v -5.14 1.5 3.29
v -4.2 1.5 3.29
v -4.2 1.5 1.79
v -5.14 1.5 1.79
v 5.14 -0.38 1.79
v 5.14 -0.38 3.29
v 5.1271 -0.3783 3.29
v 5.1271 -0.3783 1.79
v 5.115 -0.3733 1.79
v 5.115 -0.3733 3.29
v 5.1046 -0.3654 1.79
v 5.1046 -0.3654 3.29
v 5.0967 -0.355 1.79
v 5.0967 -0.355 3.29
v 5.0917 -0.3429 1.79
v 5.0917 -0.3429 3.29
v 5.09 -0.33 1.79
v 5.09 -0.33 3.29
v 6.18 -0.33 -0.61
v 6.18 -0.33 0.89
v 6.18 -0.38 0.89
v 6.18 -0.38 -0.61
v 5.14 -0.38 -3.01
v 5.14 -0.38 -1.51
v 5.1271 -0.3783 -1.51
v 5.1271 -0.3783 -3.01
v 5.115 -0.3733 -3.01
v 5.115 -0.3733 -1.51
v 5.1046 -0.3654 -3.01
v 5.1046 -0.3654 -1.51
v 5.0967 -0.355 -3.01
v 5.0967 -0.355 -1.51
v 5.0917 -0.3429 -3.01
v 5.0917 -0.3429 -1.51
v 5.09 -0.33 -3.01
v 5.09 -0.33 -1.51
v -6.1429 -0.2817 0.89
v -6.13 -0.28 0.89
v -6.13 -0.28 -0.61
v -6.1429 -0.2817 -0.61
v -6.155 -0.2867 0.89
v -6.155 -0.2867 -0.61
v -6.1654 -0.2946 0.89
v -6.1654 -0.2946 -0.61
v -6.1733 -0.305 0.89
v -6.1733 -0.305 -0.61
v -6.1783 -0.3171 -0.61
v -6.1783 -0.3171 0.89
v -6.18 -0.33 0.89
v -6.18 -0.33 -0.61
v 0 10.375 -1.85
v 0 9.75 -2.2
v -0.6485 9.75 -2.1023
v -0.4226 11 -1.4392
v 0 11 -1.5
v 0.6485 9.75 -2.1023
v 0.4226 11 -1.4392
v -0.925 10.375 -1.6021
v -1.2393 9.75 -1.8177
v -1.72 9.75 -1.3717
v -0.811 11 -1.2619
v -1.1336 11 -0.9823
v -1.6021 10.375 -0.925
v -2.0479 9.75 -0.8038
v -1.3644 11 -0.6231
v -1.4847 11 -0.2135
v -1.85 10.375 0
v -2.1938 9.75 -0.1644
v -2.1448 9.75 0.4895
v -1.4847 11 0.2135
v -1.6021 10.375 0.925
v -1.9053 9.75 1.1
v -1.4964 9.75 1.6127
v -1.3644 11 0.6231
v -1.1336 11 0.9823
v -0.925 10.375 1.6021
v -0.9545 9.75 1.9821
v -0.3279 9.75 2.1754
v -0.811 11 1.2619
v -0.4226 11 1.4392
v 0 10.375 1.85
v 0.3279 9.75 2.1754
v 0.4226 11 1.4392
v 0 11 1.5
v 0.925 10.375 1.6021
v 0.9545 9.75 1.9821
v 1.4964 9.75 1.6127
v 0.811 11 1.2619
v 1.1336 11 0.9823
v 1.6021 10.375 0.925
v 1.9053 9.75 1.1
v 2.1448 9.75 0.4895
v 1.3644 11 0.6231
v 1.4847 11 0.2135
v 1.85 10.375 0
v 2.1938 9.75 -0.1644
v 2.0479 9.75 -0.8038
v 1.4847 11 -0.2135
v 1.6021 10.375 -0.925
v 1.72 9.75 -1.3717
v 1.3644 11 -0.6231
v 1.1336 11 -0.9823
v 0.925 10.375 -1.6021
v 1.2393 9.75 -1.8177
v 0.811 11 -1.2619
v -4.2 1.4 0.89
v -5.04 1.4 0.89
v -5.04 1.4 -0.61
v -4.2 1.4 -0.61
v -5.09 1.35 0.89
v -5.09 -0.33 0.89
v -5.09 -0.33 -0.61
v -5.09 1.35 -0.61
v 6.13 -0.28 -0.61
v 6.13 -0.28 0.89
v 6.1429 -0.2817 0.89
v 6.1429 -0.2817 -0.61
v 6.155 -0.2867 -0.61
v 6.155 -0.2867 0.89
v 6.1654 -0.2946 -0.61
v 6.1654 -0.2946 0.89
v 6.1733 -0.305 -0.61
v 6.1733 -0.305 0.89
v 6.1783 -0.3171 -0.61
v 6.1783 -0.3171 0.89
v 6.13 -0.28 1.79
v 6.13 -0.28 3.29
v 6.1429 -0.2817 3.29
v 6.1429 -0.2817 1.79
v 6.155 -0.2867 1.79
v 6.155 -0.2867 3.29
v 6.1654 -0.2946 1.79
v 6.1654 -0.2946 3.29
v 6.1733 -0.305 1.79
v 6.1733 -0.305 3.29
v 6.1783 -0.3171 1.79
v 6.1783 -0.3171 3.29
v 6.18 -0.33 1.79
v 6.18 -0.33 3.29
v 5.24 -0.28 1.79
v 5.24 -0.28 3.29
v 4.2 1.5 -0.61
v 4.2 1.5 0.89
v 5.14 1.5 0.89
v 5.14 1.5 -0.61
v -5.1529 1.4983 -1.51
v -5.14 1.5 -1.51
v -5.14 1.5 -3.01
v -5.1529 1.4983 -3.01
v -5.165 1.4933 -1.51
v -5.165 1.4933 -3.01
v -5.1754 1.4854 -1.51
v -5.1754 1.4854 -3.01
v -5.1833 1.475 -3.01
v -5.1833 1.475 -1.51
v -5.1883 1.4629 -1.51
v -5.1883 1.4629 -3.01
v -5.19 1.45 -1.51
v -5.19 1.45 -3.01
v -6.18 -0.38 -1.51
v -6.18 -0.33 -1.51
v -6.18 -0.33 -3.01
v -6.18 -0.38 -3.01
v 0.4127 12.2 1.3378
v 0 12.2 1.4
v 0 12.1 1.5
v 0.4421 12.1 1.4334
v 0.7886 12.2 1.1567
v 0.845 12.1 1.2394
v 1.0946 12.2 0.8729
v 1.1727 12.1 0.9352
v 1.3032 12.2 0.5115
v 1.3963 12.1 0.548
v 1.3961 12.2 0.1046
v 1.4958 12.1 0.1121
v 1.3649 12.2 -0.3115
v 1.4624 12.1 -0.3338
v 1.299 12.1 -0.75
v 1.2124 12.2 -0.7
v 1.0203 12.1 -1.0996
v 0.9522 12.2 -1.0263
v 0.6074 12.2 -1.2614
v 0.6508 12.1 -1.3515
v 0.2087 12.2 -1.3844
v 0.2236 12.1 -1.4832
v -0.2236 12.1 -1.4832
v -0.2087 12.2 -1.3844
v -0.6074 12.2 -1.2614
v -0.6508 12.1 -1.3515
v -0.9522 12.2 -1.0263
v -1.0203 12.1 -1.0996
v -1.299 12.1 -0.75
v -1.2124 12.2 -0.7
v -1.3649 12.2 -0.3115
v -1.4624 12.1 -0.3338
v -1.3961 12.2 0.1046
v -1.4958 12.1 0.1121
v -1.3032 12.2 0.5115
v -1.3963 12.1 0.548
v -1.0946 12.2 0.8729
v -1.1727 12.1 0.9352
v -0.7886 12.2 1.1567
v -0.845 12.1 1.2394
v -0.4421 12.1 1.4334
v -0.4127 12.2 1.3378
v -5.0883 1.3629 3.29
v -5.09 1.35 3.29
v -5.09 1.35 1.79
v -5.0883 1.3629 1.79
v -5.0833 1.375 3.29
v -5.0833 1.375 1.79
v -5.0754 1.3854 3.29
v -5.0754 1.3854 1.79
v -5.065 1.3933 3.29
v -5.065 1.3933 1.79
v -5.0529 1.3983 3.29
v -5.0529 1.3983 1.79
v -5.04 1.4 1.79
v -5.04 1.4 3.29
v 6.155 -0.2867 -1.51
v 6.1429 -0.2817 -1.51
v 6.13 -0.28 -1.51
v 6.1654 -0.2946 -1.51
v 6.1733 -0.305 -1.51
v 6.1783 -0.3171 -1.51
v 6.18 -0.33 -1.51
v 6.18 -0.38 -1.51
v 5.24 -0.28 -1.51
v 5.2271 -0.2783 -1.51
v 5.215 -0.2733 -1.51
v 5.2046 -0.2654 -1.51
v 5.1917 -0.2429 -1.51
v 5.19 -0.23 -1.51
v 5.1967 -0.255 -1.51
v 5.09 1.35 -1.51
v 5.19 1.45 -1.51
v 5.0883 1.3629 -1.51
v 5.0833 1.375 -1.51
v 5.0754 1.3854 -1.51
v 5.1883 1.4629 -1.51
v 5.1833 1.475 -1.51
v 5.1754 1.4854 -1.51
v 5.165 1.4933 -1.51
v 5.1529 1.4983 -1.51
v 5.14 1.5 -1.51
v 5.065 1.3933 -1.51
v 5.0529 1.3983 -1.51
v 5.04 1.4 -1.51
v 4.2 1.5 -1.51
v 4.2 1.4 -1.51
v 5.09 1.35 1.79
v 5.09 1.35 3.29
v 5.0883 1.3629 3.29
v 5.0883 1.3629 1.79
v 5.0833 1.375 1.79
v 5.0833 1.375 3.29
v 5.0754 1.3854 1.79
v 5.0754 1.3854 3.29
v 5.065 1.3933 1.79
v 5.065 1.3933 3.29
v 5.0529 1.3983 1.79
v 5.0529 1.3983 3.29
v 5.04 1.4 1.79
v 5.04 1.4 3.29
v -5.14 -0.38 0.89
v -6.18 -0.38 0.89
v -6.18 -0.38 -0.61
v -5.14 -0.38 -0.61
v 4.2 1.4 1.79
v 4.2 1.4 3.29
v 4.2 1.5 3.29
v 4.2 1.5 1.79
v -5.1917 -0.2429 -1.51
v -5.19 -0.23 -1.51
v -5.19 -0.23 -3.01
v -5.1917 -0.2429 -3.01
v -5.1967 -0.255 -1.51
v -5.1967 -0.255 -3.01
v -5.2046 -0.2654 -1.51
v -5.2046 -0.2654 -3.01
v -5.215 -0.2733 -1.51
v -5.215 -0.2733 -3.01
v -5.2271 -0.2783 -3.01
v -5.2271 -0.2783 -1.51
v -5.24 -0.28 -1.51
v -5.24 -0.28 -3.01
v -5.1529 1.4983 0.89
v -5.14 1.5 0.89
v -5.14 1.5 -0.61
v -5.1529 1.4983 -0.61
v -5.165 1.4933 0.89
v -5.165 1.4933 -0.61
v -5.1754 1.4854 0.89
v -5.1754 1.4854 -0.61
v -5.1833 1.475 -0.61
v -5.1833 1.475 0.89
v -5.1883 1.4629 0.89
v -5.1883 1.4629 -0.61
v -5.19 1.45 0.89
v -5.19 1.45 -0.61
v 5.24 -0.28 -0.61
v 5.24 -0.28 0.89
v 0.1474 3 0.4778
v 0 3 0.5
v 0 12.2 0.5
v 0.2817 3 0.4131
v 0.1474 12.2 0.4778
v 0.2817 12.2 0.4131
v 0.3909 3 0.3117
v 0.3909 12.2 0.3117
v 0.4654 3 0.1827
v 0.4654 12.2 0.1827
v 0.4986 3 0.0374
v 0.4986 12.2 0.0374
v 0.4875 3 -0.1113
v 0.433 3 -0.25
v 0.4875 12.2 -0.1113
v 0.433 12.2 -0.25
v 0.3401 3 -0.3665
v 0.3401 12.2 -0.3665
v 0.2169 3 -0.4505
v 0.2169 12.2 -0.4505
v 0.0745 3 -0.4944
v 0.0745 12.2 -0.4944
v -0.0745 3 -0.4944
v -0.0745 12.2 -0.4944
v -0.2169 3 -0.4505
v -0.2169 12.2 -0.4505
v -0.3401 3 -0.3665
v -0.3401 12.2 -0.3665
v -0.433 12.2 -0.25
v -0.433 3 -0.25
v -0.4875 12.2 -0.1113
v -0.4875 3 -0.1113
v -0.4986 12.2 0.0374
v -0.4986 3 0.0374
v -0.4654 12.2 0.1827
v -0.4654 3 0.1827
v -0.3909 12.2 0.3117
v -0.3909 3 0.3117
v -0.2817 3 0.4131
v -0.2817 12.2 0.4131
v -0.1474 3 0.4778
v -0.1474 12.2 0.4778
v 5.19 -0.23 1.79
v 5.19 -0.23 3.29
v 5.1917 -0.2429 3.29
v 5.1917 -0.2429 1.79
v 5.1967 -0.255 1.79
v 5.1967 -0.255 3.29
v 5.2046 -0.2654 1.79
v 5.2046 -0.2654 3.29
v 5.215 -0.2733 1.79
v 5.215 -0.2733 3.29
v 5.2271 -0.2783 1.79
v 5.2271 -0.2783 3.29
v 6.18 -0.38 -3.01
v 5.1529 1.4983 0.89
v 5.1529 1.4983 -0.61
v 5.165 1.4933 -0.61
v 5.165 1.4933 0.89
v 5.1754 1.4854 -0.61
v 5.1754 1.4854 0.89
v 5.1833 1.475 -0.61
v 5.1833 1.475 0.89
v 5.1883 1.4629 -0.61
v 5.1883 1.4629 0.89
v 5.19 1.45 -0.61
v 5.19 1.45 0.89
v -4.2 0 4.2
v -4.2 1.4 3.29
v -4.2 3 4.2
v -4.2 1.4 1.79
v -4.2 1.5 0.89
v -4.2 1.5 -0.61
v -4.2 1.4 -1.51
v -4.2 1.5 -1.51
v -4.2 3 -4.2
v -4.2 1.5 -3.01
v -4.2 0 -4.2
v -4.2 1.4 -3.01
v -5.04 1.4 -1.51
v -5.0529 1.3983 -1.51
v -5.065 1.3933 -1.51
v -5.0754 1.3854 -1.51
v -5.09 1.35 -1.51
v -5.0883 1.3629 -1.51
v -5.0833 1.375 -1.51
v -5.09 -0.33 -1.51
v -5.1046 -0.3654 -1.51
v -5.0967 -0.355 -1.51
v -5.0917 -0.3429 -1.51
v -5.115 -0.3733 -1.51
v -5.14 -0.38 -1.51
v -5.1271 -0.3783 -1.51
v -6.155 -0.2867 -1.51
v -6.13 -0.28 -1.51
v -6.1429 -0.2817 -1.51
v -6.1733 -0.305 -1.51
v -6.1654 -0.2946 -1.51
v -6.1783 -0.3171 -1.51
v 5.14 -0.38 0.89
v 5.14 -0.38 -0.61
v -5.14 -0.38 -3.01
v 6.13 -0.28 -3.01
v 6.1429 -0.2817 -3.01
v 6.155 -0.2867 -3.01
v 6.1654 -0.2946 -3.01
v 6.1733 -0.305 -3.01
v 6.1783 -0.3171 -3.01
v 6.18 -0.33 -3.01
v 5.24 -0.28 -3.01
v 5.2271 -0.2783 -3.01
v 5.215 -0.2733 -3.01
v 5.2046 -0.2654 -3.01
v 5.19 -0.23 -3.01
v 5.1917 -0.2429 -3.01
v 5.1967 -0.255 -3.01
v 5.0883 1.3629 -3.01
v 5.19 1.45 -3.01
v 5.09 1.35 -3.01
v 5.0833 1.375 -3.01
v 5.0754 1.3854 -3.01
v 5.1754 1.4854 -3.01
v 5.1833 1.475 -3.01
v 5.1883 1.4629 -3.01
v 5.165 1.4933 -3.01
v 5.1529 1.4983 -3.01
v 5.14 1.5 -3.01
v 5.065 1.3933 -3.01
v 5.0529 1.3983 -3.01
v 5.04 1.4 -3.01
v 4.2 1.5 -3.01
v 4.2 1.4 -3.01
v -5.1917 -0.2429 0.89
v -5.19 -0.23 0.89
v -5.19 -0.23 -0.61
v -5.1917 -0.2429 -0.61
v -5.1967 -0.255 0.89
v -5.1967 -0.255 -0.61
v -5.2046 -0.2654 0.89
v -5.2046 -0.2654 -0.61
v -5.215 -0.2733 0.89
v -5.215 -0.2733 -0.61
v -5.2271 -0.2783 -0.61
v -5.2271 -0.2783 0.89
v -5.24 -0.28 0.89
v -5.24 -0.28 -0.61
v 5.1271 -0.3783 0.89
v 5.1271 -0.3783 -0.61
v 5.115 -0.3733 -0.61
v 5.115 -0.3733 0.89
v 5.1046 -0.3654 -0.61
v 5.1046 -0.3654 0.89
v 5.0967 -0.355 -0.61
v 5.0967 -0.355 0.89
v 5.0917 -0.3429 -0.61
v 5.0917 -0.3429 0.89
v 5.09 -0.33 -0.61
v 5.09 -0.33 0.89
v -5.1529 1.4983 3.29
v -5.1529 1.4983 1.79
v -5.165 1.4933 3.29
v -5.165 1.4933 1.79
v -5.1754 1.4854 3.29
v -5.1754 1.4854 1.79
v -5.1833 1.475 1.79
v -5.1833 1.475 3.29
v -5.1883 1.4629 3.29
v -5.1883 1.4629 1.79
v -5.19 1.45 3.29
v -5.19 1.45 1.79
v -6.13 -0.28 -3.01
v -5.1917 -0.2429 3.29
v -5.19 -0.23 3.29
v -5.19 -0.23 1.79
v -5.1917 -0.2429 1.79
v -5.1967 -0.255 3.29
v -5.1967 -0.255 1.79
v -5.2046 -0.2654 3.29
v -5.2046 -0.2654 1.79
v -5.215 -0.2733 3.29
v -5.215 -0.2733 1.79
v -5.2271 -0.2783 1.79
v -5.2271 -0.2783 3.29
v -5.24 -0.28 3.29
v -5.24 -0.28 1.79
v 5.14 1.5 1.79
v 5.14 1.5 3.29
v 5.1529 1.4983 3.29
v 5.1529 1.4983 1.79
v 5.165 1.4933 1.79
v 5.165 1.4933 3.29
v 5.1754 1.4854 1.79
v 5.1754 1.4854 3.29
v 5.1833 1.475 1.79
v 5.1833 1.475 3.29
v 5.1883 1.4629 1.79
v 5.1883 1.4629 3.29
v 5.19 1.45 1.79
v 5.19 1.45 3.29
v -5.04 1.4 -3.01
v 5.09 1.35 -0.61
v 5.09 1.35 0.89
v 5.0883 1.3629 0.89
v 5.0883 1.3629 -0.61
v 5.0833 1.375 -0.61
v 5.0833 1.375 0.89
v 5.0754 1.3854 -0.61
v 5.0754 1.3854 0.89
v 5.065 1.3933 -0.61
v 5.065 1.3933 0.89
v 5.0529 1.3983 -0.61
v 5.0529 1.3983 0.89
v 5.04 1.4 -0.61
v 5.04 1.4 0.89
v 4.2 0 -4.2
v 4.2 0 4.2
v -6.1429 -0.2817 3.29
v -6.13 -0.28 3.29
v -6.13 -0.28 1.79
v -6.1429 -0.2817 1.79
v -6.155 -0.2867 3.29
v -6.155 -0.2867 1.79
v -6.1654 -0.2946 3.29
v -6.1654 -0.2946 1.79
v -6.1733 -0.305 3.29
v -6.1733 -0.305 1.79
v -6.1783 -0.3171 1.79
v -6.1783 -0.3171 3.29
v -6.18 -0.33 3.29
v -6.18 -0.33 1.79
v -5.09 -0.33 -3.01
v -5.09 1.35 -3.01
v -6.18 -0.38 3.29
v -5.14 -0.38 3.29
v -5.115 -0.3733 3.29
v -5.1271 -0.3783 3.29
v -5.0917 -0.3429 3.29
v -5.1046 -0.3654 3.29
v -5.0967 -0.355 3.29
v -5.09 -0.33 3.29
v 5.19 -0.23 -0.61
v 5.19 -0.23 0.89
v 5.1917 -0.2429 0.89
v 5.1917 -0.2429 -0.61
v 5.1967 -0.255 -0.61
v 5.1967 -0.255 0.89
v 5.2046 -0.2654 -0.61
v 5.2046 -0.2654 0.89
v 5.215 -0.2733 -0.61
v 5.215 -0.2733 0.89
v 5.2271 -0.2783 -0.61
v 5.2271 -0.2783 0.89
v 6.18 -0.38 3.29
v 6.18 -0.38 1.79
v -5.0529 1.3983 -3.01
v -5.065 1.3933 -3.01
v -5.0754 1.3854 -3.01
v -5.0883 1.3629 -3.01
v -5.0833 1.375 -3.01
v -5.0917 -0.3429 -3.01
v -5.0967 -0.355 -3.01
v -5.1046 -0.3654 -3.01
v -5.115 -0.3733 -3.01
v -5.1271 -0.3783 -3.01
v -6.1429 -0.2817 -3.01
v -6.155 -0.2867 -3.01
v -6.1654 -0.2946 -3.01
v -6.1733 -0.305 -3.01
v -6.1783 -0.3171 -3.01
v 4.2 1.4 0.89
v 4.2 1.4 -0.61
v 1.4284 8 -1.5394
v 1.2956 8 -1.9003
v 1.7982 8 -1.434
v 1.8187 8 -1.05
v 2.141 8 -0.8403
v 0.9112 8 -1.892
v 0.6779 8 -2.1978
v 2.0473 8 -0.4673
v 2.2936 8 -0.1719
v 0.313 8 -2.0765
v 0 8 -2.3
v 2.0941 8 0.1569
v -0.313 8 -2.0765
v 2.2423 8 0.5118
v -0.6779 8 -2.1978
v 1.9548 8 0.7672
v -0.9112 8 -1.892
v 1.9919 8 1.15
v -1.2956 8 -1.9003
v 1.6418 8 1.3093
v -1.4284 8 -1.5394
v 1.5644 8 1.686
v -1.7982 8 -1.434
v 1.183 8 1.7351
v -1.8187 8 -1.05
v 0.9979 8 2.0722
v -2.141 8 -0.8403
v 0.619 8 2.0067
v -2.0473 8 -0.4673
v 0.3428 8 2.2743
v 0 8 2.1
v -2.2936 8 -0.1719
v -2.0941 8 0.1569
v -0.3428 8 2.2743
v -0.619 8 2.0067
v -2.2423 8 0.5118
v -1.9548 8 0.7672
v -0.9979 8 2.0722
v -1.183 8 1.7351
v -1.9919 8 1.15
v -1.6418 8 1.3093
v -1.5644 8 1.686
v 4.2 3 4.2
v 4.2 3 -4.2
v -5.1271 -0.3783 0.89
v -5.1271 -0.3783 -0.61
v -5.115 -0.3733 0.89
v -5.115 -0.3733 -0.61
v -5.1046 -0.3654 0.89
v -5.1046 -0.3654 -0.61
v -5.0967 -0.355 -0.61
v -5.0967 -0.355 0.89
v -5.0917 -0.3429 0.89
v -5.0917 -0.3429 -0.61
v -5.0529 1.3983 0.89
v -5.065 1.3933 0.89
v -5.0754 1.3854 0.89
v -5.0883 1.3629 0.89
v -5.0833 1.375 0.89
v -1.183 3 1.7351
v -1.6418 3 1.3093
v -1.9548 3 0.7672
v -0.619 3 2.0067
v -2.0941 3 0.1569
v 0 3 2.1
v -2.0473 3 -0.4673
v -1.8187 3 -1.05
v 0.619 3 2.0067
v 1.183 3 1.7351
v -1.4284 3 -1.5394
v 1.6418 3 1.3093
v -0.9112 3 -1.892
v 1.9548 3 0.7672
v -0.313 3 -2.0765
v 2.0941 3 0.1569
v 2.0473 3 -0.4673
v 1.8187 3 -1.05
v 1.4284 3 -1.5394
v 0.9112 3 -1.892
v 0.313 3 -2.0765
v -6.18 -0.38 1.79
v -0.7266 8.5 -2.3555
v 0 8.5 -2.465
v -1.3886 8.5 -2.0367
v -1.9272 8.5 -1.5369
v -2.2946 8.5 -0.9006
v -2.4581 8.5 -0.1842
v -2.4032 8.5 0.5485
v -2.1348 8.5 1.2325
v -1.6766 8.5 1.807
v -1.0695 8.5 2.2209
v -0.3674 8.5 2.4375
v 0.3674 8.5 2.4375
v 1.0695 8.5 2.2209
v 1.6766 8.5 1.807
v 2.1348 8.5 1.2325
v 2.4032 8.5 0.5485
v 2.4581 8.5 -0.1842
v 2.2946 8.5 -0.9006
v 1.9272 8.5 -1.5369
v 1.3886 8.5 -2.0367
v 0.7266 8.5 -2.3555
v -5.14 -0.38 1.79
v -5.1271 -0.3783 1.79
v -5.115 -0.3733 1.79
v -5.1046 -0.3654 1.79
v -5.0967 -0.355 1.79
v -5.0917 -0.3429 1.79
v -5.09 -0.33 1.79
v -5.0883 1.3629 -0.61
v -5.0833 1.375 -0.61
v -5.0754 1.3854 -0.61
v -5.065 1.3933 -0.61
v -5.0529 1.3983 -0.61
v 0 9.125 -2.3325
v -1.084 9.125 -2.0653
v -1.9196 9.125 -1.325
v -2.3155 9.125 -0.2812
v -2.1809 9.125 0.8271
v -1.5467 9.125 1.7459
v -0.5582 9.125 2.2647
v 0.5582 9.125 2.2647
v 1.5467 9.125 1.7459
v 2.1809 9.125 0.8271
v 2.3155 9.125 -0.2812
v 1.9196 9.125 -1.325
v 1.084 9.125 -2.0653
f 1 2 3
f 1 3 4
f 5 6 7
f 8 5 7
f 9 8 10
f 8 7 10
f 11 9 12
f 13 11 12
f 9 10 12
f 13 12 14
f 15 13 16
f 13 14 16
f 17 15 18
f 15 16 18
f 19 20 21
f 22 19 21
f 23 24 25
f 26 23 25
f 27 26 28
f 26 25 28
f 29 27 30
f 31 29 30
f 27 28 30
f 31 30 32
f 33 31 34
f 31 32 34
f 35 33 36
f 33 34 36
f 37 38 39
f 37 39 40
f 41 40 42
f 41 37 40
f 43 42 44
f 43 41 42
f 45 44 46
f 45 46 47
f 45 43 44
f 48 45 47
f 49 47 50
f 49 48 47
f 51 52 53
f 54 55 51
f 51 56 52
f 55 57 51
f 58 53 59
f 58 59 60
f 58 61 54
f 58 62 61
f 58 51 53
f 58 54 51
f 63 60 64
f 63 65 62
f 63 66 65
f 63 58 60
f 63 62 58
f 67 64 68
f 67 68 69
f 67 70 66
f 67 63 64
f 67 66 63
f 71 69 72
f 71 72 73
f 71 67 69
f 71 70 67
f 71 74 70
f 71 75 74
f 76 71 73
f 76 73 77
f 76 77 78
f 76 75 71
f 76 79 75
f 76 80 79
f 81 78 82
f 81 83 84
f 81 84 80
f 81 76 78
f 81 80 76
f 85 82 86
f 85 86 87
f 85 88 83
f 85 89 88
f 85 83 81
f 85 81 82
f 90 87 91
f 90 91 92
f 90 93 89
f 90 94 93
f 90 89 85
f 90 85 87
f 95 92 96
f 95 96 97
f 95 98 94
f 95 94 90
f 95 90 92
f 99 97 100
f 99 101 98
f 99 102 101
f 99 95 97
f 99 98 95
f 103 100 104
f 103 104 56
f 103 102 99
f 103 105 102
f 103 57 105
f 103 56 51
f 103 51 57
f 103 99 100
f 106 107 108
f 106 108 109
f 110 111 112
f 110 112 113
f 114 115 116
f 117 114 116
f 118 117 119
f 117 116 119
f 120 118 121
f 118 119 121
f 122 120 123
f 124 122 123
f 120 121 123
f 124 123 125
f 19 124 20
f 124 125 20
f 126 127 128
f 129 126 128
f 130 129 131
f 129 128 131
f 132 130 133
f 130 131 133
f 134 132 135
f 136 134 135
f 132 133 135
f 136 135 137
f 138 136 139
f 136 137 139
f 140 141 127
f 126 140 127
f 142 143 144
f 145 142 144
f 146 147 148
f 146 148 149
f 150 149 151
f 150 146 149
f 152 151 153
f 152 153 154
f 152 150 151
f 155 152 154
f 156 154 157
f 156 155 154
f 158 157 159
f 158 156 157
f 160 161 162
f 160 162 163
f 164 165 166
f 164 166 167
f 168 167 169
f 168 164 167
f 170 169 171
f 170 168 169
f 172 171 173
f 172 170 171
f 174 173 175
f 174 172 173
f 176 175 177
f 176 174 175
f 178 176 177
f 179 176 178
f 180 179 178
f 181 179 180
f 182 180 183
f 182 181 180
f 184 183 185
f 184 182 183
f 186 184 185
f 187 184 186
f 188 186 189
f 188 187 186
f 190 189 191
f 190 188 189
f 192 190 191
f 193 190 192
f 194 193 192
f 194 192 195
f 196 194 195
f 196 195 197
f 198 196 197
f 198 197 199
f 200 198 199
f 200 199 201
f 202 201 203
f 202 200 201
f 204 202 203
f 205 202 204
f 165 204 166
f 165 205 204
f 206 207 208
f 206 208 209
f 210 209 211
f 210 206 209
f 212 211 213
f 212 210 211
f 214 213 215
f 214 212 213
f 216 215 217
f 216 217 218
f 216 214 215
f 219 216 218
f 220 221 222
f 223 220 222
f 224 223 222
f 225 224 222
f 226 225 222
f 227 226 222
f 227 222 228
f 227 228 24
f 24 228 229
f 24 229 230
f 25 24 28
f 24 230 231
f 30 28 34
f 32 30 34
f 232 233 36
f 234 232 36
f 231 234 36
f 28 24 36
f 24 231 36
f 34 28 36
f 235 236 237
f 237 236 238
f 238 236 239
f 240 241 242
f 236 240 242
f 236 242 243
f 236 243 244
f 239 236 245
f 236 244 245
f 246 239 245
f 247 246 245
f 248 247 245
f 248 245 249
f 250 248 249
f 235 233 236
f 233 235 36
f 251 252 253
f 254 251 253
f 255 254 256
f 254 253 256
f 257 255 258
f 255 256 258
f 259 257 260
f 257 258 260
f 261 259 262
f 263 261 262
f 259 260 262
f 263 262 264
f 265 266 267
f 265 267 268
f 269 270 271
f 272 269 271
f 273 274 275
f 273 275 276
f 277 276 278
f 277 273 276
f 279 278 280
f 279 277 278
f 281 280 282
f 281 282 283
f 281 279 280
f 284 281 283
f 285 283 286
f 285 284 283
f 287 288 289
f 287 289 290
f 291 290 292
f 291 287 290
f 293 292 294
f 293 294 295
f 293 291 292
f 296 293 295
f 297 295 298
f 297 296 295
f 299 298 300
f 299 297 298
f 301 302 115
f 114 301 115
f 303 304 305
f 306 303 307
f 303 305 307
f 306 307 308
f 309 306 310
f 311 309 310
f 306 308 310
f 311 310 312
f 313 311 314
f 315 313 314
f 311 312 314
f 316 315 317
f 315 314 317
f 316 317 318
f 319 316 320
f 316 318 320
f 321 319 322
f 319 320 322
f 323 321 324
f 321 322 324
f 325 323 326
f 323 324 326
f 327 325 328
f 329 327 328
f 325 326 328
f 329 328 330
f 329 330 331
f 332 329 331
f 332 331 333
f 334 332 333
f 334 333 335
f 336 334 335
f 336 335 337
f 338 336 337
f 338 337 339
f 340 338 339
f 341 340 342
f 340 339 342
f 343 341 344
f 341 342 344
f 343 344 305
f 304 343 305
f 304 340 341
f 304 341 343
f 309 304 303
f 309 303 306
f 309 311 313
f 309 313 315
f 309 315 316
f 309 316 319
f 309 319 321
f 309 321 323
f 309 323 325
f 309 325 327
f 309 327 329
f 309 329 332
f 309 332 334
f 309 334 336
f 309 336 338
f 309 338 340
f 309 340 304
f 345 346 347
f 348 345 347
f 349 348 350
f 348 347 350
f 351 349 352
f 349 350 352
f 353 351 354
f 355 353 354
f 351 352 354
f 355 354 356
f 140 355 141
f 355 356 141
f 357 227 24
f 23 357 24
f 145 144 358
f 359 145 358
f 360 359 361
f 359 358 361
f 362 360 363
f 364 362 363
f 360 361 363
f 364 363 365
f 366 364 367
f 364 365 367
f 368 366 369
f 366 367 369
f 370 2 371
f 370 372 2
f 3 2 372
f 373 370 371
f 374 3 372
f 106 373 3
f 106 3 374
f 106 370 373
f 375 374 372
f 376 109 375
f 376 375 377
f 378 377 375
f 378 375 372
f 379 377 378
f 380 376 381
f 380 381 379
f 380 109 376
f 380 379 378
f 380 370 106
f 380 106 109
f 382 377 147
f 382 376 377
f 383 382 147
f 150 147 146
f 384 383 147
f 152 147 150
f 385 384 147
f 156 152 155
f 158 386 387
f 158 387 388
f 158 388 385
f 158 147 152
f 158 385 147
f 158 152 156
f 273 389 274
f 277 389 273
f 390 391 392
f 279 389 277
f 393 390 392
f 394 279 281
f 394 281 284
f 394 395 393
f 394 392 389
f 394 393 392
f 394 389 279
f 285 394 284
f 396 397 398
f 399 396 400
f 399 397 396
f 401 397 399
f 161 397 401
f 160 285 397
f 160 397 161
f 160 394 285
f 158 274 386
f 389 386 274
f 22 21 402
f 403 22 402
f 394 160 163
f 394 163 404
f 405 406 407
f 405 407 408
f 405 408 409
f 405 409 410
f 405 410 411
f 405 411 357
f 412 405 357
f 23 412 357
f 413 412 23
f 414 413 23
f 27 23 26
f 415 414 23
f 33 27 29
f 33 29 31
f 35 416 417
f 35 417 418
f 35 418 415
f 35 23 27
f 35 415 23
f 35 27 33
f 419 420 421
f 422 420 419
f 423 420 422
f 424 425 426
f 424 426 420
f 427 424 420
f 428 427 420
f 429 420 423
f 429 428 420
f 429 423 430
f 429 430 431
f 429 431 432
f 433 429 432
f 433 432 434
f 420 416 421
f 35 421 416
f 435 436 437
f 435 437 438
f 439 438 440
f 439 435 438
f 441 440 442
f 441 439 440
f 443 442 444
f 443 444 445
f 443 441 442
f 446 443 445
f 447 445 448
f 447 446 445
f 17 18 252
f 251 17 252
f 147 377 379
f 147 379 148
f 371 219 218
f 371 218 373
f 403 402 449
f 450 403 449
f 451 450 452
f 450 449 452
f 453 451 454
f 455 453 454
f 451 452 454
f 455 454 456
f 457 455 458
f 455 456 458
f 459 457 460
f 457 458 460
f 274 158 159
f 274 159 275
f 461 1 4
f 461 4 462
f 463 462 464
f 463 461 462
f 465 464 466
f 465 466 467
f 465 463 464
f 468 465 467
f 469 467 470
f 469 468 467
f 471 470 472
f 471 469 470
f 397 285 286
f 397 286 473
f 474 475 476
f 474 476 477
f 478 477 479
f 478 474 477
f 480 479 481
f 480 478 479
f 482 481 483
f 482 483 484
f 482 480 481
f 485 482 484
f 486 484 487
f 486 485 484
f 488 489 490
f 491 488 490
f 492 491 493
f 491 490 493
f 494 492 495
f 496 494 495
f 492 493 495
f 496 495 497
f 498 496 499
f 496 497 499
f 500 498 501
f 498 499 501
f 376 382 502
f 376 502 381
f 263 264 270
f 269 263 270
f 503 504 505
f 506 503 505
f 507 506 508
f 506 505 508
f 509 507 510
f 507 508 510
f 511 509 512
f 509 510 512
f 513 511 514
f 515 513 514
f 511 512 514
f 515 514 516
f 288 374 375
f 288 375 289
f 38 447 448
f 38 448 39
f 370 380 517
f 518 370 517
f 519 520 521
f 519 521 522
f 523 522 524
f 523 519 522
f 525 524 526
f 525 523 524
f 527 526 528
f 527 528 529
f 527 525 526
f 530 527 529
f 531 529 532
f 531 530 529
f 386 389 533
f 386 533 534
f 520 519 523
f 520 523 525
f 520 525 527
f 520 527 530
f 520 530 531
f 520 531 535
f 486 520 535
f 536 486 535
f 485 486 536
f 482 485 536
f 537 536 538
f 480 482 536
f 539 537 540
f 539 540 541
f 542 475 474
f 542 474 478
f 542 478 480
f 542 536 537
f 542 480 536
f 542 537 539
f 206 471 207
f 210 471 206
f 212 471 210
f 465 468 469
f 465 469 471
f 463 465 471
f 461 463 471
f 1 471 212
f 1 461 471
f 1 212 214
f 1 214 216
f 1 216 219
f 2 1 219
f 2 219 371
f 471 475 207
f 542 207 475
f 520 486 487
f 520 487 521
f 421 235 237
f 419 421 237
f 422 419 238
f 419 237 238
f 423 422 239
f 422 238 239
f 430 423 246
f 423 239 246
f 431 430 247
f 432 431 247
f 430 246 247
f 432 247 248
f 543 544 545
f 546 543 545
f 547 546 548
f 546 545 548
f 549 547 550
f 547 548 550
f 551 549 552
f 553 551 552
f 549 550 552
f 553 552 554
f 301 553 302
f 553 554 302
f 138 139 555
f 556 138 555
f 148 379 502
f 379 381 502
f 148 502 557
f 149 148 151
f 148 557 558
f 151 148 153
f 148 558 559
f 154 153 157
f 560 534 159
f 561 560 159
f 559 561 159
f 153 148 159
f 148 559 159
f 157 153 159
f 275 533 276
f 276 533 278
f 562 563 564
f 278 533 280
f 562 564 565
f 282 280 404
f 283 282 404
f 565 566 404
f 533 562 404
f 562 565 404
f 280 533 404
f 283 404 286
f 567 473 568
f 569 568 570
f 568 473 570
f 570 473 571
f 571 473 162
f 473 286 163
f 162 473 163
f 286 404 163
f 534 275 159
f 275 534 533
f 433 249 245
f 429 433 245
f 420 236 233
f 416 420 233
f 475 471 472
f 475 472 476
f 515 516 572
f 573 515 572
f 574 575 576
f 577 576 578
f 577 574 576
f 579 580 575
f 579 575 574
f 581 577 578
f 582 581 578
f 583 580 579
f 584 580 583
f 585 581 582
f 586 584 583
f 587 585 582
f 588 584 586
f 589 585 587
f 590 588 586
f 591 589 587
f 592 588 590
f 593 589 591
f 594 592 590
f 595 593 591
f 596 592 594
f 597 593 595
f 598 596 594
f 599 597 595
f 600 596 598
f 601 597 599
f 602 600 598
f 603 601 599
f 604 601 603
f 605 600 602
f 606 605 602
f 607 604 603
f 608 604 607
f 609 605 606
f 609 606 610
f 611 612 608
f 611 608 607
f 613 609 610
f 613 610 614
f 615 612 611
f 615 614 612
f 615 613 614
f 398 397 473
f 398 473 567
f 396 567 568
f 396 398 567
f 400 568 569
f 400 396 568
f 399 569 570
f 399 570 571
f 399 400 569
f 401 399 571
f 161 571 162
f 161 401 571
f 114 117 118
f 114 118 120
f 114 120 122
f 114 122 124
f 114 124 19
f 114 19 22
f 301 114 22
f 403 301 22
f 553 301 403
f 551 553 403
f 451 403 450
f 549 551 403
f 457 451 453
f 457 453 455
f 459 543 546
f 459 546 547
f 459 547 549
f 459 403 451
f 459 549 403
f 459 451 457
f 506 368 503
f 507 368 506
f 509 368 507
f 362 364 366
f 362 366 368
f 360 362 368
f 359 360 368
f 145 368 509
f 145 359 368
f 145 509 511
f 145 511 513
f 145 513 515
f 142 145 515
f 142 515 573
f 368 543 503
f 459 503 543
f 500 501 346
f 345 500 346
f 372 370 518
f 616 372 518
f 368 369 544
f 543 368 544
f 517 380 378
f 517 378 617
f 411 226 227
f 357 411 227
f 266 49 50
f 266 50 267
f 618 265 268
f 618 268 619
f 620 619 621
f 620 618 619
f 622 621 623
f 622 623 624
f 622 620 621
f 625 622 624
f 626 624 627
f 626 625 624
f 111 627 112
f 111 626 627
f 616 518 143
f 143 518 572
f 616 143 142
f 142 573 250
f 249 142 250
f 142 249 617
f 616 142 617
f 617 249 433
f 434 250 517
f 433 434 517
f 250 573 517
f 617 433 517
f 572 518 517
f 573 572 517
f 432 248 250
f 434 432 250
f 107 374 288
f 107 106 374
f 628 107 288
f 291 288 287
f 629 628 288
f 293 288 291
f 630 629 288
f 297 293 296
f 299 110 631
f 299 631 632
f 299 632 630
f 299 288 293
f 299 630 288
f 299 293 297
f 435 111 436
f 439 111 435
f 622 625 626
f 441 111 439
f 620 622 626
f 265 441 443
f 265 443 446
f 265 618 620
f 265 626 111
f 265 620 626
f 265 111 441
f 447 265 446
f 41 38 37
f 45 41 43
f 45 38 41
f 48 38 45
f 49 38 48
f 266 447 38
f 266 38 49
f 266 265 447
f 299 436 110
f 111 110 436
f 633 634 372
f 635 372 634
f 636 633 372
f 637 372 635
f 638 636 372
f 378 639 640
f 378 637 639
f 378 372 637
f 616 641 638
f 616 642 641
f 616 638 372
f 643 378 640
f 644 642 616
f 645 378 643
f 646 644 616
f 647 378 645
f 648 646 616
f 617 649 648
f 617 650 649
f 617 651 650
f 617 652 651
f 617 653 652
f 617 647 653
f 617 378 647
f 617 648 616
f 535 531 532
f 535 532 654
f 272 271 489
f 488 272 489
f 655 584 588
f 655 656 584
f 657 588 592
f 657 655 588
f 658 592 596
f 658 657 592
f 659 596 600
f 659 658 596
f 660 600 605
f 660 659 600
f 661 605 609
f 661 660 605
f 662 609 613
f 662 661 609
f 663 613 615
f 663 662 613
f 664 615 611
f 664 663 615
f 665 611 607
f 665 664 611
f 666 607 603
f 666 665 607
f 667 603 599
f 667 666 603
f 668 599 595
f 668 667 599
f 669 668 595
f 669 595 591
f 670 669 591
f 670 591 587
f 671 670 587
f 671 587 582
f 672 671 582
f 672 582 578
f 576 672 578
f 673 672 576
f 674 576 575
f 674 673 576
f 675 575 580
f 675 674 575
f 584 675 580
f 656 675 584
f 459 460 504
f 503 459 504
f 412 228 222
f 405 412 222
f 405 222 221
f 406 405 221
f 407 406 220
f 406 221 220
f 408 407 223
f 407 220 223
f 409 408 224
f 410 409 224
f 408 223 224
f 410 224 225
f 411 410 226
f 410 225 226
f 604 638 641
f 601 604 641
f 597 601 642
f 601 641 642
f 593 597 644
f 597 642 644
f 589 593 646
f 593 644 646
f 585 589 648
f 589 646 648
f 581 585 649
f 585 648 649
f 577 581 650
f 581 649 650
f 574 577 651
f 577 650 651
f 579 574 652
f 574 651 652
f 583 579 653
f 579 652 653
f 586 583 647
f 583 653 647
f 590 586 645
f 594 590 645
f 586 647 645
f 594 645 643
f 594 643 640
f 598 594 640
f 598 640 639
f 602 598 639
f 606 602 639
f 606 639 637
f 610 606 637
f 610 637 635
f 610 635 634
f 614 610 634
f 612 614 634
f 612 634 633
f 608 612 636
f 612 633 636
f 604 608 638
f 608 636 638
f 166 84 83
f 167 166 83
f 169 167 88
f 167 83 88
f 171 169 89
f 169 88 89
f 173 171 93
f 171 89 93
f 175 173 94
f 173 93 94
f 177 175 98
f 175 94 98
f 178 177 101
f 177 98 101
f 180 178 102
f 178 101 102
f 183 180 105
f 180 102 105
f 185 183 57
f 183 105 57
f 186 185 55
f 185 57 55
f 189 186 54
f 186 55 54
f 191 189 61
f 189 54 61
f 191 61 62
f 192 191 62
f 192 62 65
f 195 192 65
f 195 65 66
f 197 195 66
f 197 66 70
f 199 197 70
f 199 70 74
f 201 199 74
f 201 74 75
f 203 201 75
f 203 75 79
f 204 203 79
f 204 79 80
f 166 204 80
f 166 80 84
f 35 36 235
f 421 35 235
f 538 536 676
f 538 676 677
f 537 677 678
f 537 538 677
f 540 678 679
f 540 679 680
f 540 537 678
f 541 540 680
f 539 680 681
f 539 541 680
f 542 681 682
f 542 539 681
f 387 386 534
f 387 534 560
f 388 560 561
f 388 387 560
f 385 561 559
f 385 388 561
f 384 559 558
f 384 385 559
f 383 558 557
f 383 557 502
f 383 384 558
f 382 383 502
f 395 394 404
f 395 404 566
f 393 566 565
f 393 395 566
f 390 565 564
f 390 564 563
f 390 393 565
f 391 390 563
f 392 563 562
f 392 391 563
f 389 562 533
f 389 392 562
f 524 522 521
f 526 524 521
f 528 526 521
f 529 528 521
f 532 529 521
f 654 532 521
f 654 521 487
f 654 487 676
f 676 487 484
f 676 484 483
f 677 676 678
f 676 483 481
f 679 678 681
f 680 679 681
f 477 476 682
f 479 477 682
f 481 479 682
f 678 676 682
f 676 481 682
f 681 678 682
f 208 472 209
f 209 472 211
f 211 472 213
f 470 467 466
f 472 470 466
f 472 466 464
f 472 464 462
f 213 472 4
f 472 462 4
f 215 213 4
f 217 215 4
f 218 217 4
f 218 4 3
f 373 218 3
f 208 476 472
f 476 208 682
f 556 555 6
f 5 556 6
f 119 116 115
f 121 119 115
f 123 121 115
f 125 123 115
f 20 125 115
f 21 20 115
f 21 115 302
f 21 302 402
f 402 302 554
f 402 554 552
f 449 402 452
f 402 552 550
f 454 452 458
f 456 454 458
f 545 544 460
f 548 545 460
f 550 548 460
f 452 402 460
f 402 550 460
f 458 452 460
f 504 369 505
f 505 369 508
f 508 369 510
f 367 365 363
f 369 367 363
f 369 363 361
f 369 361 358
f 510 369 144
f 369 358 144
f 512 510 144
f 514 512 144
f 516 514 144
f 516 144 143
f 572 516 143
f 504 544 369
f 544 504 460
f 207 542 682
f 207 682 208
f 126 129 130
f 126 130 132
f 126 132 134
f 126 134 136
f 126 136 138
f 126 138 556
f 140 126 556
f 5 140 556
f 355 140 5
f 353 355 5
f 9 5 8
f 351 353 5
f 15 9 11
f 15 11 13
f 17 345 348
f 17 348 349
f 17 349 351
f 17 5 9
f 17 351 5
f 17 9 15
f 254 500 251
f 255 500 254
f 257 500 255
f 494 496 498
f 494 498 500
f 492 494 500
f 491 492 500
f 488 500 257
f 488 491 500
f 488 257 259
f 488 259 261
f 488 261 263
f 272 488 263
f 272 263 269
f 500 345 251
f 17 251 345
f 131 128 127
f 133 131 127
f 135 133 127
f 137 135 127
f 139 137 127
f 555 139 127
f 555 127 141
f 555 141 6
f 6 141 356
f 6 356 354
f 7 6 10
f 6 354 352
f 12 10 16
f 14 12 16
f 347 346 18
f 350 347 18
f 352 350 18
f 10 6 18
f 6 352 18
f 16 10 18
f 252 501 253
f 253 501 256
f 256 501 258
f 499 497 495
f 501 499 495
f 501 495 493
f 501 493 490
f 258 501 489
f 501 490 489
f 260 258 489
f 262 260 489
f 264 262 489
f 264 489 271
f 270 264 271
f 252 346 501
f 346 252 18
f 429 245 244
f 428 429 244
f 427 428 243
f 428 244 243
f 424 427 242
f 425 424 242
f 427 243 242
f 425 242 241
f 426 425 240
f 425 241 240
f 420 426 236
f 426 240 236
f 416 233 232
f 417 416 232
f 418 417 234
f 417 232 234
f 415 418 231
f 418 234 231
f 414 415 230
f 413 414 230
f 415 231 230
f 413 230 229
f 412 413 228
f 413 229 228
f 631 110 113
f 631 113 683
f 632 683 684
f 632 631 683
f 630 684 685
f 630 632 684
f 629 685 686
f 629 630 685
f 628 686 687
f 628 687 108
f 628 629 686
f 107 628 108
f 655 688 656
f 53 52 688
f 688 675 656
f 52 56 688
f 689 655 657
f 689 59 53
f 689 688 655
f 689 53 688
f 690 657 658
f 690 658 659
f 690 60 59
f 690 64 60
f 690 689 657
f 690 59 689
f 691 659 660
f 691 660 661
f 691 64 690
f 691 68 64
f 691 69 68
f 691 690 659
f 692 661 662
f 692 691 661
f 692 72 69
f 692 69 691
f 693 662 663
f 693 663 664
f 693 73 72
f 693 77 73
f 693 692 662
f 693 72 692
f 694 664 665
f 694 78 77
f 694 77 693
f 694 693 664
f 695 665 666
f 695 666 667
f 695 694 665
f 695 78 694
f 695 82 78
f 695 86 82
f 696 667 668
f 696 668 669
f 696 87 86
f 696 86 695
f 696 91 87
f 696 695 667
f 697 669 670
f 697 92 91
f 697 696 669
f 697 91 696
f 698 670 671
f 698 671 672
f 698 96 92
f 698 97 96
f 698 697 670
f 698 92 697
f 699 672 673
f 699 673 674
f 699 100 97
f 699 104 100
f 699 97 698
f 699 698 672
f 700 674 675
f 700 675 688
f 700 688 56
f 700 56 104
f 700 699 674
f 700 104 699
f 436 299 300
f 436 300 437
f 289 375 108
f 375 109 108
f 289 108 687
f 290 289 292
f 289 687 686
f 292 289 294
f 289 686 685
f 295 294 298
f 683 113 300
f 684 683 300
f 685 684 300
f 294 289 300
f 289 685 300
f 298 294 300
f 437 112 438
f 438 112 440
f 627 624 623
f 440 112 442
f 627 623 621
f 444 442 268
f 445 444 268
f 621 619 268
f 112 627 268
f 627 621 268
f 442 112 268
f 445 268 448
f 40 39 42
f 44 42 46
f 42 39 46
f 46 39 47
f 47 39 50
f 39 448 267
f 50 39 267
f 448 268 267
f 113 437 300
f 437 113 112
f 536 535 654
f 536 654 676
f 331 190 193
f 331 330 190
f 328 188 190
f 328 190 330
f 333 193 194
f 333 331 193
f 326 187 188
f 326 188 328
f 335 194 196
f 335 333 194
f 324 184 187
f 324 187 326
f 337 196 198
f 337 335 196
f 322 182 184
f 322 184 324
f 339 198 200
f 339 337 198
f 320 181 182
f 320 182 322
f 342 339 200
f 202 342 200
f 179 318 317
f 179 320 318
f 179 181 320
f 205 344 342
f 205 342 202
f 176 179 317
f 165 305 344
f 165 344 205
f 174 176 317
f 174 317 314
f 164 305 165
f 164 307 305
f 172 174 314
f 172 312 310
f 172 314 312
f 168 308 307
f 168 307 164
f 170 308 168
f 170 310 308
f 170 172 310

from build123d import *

# Parameters (mm, degrees)
SKETCH1_W            = 8.4
SKETCH1_H            = 8.4
BOSS_EXTRUDE1_DEPTH  = 3
BOSS_EXTRUDE2_DEPTH  = 1.5
LPATTERN1_COUNT      = 3
LPATTERN1_PITCH      = 2.4
MIRROR1_COPY_1_DEPTH = 1.5
MIRROR1_COPY_2_DEPTH = 1.5
SKETCH3_R            = 2.1
BOSS_EXTRUDE3_DEPTH  = 5
SKETCH5_R            = 1.5
BOSS_EXTRUDE4_DEPTH  = 1.2
CHAMFER1_SIZE        = 0.1
SKETCH7_R            = 0.5
CUT_EXTRUDE1_DEPTH   = 9.2


with BuildPart() as part:
    # Sketch1 → Boss-Extrude1 (new body)
    with BuildSketch(Plane(origin=(0, 0, 0), x_dir=(1, 0, 0), z_dir=(0, 1, 0))):
        Rectangle(SKETCH1_W, SKETCH1_H)
    extrude(amount=BOSS_EXTRUDE1_DEPTH)


with BuildPart() as body_2:
    # Sketch2 → Boss-Extrude2 (new body)
    with BuildSketch(Plane.XY.offset(3.29)):
        with BuildLine():
            Line((4.2, 1.5), (5.14, 1.5))
            ThreePointArc((5.14, 1.5), (5.175355339, 1.485355339), (5.19, 1.45))
            Line((5.19, 1.45), (5.19, -0.23))
            ThreePointArc((5.19, -0.23), (5.204644661, -0.265355339), (5.24, -0.28))
            Line((5.24, -0.28), (6.13, -0.28))
            ThreePointArc((6.13, -0.28), (6.165355339, -0.294644661), (6.18, -0.33))
            Line((6.18, -0.33), (6.18, -0.38))
            Line((6.18, -0.38), (5.14, -0.38))
            ThreePointArc((5.14, -0.38), (5.104644661, -0.365355339), (5.09, -0.33))
            Line((5.09, -0.33), (5.09, 1.35))
            ThreePointArc((5.09, 1.35), (5.075355339, 1.385355339), (5.04, 1.4))
            Line((5.04, 1.4), (4.2, 1.4))
            Line((4.2, 1.4), (4.2, 1.5))
        make_face()
    boss_extrude2 = extrude(amount=-BOSS_EXTRUDE2_DEPTH)


with BuildPart() as part_1:
    add(part.part)

    # LPattern1: Boss-Extrude2 ×3
    with Locations(*[(0, 0, -i * LPATTERN1_PITCH) for i in range(1, LPATTERN1_COUNT)]):
        add(boss_extrude2)

    # Mirror1: Boss-Extrude2 across plane
    add(boss_extrude2.mirror(Plane(origin=(0, 0, 0), x_dir=(0, 0, 1), z_dir=(1, 0, 0))))

    # Mirror1 copy 1 sketch → Mirror1 copy 1 (add)
    with BuildSketch(Plane(origin=(0, 0, 0.89), x_dir=(-1, 0, 0), z_dir=(0, 0, 1))):
        with BuildLine():
            Line((4.2, -1.5), (5.14, -1.5))
            ThreePointArc((5.14, -1.5), (5.175355339, -1.485355339), (5.19, -1.45))
            Line((5.19, -1.45), (5.19, 0.23))
            ThreePointArc((5.19, 0.23), (5.204644661, 0.265355339), (5.24, 0.28))
            Line((5.24, 0.28), (6.13, 0.28))
            ThreePointArc((6.13, 0.28), (6.165355339, 0.294644661), (6.18, 0.33))
            Line((6.18, 0.33), (6.18, 0.38))
            Line((6.18, 0.38), (5.14, 0.38))
            ThreePointArc((5.14, 0.38), (5.104644661, 0.365355339), (5.09, 0.33))
            Line((5.09, 0.33), (5.09, -1.35))
            ThreePointArc((5.09, -1.35), (5.075355339, -1.385355339), (5.04, -1.4))
            Line((5.04, -1.4), (4.2, -1.4))
            Line((4.2, -1.4), (4.2, -1.5))
        make_face()
    extrude(amount=-MIRROR1_COPY_1_DEPTH)

    # Mirror1 copy 2 sketch → Mirror1 copy 2 (add)
    with BuildSketch(Plane(origin=(0, 0, -1.51), x_dir=(-1, 0, 0), z_dir=(0, 0, 1))):
        with BuildLine():
            Line((4.2, -1.5), (5.14, -1.5))
            ThreePointArc((5.14, -1.5), (5.175355339, -1.485355339), (5.19, -1.45))
            Line((5.19, -1.45), (5.19, 0.23))
            ThreePointArc((5.19, 0.23), (5.204644661, 0.265355339), (5.24, 0.28))
            Line((5.24, 0.28), (6.13, 0.28))
            ThreePointArc((6.13, 0.28), (6.165355339, 0.294644661), (6.18, 0.33))
            Line((6.18, 0.33), (6.18, 0.38))
            Line((6.18, 0.38), (5.14, 0.38))
            ThreePointArc((5.14, 0.38), (5.104644661, 0.365355339), (5.09, 0.33))
            Line((5.09, 0.33), (5.09, -1.35))
            ThreePointArc((5.09, -1.35), (5.075355339, -1.385355339), (5.04, -1.4))
            Line((5.04, -1.4), (4.2, -1.4))
            Line((4.2, -1.4), (4.2, -1.5))
        make_face()
    extrude(amount=-MIRROR1_COPY_2_DEPTH)

    # Sketch3 → Boss-Extrude3 (add)
    with BuildSketch(Plane(origin=(0, 3, 0), x_dir=(1, 0, 0), z_dir=(0, 1, 0))):
        with Locations(Location((0, 0, 0), (0, 0, 270))):
            Circle(SKETCH3_R)
    extrude(amount=BOSS_EXTRUDE3_DEPTH)

    # Sketch4 → Revolve1 (revolve)
    with BuildSketch(Plane.XY, mode=Mode.PRIVATE) as revolve1_sk:
        Polygon((0, 8), (-2.3, 8), (-2.465, 8.5), (-2.2, 9.75), (-1.5, 11), (0, 11), align=None)
    revolve(revolve1_sk.sketch.rotate(Axis((0, 8, 0), (0, 1, 0)), 270), axis=Axis((0, 8, 0), (0, 1, 0)))

    # Sketch5 → Boss-Extrude4 (add)
    with BuildSketch(Plane(origin=(0, 11, 0), x_dir=(1, 0, 0), z_dir=(0, 1, 0))):
        with Locations(Location((0, 0, 0), (0, 0, 270))):
            Circle(SKETCH5_R)
    extrude(amount=BOSS_EXTRUDE4_DEPTH)

    # Chamfer1
    chamfer1_edges = [part_1.edges().sort_by_distance(p)[0] for p in [
        (0, 12.2, -1.5),
    ]]
    chamfer(chamfer1_edges, length=CHAMFER1_SIZE)

    # Sketch7 → Cut-Extrude1 (cut)
    with BuildSketch(Plane(origin=(0, 12.2, 0), x_dir=(1, 0, 0), z_dir=(0, 1, 0))):
        with Locations(Location((0, 0, 0), (0, 0, 270))):
            Circle(SKETCH7_R)
    extrude(amount=-CUT_EXTRUDE1_DEPTH, mode=Mode.SUBTRACT)


solid = Compound([body_2.part, part_1.part])
